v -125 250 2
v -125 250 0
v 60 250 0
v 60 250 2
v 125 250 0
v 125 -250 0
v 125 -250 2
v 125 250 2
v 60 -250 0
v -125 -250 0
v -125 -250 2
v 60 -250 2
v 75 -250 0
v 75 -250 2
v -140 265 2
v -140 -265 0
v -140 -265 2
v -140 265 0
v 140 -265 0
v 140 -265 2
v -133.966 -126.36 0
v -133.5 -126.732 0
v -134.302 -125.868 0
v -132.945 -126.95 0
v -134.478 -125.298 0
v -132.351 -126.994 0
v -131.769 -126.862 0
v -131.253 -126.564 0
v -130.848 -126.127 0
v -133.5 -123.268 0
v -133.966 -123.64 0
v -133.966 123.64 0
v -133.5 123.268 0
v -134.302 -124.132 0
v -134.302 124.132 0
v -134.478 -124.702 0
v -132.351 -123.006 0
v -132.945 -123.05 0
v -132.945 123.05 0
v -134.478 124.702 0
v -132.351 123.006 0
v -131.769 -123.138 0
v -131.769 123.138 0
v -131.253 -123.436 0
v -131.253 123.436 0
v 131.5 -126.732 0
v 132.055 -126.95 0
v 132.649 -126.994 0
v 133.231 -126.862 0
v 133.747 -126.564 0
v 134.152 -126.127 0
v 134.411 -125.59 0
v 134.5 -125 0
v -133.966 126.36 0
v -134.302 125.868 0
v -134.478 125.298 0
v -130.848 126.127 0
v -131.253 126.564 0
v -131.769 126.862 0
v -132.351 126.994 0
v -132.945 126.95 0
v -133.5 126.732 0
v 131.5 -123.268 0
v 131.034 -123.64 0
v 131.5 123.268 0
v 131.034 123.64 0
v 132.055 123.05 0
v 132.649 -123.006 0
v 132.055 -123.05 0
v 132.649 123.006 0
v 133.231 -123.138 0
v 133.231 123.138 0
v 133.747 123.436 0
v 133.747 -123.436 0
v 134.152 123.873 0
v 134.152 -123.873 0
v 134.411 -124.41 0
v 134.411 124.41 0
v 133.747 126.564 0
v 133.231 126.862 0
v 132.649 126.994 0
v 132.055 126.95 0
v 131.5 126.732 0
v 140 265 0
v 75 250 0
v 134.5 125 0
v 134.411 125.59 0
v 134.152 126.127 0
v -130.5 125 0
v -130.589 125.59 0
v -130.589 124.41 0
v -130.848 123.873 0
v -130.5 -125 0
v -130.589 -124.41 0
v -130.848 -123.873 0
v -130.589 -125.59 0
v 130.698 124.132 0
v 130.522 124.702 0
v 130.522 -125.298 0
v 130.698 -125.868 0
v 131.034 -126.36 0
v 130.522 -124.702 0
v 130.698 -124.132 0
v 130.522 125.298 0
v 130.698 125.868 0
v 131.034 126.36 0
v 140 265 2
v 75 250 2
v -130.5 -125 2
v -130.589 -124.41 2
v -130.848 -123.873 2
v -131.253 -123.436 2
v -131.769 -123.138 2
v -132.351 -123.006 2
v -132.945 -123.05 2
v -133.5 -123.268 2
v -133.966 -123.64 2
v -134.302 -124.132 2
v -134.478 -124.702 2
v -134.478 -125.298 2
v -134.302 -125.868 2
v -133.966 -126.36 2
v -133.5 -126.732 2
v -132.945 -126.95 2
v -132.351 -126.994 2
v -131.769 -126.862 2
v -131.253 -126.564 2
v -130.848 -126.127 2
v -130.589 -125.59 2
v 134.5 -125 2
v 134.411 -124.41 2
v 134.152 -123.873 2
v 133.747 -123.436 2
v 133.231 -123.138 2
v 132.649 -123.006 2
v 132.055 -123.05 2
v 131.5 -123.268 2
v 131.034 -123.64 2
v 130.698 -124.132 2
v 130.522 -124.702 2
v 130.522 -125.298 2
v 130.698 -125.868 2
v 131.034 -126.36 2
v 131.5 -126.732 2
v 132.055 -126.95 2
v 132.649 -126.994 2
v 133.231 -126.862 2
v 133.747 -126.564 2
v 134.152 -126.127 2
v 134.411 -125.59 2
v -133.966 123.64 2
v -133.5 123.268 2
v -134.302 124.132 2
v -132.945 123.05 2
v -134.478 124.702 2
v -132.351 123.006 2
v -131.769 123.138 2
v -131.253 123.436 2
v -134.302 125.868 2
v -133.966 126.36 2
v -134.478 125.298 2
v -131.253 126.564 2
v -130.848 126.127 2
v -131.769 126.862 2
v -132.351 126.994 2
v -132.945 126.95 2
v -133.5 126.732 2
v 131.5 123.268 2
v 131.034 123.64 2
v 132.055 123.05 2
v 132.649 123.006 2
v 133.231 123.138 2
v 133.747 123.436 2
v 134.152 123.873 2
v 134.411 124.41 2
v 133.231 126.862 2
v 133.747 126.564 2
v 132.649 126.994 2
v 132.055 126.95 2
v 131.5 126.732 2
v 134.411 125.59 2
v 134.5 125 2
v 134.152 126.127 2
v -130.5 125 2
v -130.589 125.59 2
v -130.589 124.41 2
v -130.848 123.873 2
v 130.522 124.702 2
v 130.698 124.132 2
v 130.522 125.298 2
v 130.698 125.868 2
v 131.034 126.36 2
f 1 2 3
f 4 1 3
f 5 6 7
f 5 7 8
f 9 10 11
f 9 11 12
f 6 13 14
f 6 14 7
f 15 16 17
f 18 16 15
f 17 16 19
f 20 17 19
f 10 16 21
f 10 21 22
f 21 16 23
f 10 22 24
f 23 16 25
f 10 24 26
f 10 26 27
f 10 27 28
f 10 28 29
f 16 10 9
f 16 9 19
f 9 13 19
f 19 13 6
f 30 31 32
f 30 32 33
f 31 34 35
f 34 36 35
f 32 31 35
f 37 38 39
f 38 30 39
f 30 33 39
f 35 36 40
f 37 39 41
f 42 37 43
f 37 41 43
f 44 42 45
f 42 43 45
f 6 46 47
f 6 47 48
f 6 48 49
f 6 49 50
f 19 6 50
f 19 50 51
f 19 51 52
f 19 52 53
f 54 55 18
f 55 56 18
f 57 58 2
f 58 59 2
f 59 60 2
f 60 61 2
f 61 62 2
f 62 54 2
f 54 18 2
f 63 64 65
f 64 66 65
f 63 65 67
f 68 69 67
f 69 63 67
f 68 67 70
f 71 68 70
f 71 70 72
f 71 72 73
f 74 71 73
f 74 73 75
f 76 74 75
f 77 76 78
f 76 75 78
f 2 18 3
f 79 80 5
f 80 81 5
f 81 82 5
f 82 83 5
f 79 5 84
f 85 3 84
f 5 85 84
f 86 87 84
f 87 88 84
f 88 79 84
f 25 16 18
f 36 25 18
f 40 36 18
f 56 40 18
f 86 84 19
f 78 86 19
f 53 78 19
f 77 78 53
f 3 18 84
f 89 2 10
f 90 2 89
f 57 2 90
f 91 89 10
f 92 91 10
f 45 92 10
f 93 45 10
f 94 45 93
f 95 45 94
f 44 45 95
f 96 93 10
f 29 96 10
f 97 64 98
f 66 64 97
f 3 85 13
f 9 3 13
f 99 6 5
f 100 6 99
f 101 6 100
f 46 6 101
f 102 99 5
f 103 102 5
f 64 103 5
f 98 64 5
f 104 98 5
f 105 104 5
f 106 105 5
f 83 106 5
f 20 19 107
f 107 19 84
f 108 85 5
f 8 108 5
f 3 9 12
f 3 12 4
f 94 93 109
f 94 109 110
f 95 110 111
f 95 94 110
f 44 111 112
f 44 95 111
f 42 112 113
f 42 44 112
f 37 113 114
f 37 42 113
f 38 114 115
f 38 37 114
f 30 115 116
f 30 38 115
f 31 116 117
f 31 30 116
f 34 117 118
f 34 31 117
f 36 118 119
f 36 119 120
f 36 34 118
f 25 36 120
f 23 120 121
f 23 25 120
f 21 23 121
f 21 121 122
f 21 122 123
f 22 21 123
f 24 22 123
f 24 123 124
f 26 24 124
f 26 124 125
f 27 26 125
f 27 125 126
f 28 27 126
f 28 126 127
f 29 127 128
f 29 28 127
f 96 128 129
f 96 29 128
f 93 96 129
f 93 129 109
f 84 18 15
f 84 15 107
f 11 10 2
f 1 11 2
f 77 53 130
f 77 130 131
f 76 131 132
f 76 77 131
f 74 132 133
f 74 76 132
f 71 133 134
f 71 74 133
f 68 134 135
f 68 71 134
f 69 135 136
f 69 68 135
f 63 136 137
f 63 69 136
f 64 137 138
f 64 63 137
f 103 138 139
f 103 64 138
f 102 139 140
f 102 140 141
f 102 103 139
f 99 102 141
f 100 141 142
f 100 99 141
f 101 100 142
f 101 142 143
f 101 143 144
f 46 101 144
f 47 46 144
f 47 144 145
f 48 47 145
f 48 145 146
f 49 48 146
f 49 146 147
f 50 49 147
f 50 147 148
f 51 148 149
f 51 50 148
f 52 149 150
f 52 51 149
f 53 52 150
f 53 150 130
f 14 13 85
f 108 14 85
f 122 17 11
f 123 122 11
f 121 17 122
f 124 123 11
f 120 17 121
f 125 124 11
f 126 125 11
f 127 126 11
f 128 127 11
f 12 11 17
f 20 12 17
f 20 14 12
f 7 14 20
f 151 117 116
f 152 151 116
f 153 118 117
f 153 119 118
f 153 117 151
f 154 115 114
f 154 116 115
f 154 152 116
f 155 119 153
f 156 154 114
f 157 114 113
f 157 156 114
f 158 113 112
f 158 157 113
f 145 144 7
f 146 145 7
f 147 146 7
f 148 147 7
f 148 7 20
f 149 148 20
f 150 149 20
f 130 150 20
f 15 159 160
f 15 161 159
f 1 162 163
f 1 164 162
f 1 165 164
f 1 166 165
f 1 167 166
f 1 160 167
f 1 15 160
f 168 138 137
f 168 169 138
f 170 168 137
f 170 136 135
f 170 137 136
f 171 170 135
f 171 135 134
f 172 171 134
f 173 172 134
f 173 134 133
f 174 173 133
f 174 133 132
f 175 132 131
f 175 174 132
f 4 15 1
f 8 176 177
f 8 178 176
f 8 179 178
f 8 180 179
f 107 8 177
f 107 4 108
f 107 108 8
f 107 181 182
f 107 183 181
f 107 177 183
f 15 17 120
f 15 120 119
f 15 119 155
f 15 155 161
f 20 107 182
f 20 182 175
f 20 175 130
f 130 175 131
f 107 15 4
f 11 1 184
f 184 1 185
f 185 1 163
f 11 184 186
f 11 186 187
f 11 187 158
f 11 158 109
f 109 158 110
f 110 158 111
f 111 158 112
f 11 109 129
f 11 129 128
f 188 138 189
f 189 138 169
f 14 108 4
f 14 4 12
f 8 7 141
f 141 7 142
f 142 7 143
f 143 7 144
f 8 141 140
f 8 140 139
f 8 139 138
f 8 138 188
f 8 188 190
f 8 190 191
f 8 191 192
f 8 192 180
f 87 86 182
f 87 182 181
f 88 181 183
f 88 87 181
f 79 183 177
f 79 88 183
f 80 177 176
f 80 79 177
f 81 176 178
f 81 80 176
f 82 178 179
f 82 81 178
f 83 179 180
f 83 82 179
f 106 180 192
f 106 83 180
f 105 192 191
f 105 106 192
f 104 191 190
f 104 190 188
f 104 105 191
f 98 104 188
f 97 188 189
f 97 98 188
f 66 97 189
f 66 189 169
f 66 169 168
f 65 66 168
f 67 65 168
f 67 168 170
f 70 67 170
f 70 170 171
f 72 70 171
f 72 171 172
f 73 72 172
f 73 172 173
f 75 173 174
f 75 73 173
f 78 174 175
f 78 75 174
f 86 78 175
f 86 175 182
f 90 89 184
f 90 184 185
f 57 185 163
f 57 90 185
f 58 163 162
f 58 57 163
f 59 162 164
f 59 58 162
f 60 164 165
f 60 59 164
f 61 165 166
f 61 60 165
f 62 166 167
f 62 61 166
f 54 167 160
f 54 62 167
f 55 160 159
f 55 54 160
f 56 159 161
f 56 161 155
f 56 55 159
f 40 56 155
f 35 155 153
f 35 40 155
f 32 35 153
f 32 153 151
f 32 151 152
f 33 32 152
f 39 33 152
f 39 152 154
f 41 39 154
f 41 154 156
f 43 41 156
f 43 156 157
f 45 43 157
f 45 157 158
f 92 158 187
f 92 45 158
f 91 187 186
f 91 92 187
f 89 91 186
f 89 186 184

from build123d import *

# Parameters (mm, degrees)
SKETCH_W   = 280
SKETCH_H   = 530
SKETCH_R   = 2
SKETCH_W_2 = 185
SKETCH_H_2 = 500
SKETCH_W_3 = 50
PAD_DEPTH  = 2


with BuildPart() as part:
    # Sketch → Pad (new body)
    with BuildSketch(Plane.XY):
        Rectangle(SKETCH_W, SKETCH_H)
        with Locations((-132.5, 125)):
            Circle(SKETCH_R, mode=Mode.SUBTRACT)
        with Locations((-132.5, -125)):
            Circle(SKETCH_R, mode=Mode.SUBTRACT)
        with Locations((132.5, -125)):
            Circle(SKETCH_R, mode=Mode.SUBTRACT)
        with Locations((132.5, 125)):
            Circle(SKETCH_R, mode=Mode.SUBTRACT)
        with Locations((-32.5, 0)):
            Rectangle(SKETCH_W_2, SKETCH_H_2, mode=Mode.SUBTRACT)
        with Locations((100, 0)):
            Rectangle(SKETCH_W_3, SKETCH_H_2, mode=Mode.SUBTRACT)
    extrude(amount=PAD_DEPTH)


solid = part.part
